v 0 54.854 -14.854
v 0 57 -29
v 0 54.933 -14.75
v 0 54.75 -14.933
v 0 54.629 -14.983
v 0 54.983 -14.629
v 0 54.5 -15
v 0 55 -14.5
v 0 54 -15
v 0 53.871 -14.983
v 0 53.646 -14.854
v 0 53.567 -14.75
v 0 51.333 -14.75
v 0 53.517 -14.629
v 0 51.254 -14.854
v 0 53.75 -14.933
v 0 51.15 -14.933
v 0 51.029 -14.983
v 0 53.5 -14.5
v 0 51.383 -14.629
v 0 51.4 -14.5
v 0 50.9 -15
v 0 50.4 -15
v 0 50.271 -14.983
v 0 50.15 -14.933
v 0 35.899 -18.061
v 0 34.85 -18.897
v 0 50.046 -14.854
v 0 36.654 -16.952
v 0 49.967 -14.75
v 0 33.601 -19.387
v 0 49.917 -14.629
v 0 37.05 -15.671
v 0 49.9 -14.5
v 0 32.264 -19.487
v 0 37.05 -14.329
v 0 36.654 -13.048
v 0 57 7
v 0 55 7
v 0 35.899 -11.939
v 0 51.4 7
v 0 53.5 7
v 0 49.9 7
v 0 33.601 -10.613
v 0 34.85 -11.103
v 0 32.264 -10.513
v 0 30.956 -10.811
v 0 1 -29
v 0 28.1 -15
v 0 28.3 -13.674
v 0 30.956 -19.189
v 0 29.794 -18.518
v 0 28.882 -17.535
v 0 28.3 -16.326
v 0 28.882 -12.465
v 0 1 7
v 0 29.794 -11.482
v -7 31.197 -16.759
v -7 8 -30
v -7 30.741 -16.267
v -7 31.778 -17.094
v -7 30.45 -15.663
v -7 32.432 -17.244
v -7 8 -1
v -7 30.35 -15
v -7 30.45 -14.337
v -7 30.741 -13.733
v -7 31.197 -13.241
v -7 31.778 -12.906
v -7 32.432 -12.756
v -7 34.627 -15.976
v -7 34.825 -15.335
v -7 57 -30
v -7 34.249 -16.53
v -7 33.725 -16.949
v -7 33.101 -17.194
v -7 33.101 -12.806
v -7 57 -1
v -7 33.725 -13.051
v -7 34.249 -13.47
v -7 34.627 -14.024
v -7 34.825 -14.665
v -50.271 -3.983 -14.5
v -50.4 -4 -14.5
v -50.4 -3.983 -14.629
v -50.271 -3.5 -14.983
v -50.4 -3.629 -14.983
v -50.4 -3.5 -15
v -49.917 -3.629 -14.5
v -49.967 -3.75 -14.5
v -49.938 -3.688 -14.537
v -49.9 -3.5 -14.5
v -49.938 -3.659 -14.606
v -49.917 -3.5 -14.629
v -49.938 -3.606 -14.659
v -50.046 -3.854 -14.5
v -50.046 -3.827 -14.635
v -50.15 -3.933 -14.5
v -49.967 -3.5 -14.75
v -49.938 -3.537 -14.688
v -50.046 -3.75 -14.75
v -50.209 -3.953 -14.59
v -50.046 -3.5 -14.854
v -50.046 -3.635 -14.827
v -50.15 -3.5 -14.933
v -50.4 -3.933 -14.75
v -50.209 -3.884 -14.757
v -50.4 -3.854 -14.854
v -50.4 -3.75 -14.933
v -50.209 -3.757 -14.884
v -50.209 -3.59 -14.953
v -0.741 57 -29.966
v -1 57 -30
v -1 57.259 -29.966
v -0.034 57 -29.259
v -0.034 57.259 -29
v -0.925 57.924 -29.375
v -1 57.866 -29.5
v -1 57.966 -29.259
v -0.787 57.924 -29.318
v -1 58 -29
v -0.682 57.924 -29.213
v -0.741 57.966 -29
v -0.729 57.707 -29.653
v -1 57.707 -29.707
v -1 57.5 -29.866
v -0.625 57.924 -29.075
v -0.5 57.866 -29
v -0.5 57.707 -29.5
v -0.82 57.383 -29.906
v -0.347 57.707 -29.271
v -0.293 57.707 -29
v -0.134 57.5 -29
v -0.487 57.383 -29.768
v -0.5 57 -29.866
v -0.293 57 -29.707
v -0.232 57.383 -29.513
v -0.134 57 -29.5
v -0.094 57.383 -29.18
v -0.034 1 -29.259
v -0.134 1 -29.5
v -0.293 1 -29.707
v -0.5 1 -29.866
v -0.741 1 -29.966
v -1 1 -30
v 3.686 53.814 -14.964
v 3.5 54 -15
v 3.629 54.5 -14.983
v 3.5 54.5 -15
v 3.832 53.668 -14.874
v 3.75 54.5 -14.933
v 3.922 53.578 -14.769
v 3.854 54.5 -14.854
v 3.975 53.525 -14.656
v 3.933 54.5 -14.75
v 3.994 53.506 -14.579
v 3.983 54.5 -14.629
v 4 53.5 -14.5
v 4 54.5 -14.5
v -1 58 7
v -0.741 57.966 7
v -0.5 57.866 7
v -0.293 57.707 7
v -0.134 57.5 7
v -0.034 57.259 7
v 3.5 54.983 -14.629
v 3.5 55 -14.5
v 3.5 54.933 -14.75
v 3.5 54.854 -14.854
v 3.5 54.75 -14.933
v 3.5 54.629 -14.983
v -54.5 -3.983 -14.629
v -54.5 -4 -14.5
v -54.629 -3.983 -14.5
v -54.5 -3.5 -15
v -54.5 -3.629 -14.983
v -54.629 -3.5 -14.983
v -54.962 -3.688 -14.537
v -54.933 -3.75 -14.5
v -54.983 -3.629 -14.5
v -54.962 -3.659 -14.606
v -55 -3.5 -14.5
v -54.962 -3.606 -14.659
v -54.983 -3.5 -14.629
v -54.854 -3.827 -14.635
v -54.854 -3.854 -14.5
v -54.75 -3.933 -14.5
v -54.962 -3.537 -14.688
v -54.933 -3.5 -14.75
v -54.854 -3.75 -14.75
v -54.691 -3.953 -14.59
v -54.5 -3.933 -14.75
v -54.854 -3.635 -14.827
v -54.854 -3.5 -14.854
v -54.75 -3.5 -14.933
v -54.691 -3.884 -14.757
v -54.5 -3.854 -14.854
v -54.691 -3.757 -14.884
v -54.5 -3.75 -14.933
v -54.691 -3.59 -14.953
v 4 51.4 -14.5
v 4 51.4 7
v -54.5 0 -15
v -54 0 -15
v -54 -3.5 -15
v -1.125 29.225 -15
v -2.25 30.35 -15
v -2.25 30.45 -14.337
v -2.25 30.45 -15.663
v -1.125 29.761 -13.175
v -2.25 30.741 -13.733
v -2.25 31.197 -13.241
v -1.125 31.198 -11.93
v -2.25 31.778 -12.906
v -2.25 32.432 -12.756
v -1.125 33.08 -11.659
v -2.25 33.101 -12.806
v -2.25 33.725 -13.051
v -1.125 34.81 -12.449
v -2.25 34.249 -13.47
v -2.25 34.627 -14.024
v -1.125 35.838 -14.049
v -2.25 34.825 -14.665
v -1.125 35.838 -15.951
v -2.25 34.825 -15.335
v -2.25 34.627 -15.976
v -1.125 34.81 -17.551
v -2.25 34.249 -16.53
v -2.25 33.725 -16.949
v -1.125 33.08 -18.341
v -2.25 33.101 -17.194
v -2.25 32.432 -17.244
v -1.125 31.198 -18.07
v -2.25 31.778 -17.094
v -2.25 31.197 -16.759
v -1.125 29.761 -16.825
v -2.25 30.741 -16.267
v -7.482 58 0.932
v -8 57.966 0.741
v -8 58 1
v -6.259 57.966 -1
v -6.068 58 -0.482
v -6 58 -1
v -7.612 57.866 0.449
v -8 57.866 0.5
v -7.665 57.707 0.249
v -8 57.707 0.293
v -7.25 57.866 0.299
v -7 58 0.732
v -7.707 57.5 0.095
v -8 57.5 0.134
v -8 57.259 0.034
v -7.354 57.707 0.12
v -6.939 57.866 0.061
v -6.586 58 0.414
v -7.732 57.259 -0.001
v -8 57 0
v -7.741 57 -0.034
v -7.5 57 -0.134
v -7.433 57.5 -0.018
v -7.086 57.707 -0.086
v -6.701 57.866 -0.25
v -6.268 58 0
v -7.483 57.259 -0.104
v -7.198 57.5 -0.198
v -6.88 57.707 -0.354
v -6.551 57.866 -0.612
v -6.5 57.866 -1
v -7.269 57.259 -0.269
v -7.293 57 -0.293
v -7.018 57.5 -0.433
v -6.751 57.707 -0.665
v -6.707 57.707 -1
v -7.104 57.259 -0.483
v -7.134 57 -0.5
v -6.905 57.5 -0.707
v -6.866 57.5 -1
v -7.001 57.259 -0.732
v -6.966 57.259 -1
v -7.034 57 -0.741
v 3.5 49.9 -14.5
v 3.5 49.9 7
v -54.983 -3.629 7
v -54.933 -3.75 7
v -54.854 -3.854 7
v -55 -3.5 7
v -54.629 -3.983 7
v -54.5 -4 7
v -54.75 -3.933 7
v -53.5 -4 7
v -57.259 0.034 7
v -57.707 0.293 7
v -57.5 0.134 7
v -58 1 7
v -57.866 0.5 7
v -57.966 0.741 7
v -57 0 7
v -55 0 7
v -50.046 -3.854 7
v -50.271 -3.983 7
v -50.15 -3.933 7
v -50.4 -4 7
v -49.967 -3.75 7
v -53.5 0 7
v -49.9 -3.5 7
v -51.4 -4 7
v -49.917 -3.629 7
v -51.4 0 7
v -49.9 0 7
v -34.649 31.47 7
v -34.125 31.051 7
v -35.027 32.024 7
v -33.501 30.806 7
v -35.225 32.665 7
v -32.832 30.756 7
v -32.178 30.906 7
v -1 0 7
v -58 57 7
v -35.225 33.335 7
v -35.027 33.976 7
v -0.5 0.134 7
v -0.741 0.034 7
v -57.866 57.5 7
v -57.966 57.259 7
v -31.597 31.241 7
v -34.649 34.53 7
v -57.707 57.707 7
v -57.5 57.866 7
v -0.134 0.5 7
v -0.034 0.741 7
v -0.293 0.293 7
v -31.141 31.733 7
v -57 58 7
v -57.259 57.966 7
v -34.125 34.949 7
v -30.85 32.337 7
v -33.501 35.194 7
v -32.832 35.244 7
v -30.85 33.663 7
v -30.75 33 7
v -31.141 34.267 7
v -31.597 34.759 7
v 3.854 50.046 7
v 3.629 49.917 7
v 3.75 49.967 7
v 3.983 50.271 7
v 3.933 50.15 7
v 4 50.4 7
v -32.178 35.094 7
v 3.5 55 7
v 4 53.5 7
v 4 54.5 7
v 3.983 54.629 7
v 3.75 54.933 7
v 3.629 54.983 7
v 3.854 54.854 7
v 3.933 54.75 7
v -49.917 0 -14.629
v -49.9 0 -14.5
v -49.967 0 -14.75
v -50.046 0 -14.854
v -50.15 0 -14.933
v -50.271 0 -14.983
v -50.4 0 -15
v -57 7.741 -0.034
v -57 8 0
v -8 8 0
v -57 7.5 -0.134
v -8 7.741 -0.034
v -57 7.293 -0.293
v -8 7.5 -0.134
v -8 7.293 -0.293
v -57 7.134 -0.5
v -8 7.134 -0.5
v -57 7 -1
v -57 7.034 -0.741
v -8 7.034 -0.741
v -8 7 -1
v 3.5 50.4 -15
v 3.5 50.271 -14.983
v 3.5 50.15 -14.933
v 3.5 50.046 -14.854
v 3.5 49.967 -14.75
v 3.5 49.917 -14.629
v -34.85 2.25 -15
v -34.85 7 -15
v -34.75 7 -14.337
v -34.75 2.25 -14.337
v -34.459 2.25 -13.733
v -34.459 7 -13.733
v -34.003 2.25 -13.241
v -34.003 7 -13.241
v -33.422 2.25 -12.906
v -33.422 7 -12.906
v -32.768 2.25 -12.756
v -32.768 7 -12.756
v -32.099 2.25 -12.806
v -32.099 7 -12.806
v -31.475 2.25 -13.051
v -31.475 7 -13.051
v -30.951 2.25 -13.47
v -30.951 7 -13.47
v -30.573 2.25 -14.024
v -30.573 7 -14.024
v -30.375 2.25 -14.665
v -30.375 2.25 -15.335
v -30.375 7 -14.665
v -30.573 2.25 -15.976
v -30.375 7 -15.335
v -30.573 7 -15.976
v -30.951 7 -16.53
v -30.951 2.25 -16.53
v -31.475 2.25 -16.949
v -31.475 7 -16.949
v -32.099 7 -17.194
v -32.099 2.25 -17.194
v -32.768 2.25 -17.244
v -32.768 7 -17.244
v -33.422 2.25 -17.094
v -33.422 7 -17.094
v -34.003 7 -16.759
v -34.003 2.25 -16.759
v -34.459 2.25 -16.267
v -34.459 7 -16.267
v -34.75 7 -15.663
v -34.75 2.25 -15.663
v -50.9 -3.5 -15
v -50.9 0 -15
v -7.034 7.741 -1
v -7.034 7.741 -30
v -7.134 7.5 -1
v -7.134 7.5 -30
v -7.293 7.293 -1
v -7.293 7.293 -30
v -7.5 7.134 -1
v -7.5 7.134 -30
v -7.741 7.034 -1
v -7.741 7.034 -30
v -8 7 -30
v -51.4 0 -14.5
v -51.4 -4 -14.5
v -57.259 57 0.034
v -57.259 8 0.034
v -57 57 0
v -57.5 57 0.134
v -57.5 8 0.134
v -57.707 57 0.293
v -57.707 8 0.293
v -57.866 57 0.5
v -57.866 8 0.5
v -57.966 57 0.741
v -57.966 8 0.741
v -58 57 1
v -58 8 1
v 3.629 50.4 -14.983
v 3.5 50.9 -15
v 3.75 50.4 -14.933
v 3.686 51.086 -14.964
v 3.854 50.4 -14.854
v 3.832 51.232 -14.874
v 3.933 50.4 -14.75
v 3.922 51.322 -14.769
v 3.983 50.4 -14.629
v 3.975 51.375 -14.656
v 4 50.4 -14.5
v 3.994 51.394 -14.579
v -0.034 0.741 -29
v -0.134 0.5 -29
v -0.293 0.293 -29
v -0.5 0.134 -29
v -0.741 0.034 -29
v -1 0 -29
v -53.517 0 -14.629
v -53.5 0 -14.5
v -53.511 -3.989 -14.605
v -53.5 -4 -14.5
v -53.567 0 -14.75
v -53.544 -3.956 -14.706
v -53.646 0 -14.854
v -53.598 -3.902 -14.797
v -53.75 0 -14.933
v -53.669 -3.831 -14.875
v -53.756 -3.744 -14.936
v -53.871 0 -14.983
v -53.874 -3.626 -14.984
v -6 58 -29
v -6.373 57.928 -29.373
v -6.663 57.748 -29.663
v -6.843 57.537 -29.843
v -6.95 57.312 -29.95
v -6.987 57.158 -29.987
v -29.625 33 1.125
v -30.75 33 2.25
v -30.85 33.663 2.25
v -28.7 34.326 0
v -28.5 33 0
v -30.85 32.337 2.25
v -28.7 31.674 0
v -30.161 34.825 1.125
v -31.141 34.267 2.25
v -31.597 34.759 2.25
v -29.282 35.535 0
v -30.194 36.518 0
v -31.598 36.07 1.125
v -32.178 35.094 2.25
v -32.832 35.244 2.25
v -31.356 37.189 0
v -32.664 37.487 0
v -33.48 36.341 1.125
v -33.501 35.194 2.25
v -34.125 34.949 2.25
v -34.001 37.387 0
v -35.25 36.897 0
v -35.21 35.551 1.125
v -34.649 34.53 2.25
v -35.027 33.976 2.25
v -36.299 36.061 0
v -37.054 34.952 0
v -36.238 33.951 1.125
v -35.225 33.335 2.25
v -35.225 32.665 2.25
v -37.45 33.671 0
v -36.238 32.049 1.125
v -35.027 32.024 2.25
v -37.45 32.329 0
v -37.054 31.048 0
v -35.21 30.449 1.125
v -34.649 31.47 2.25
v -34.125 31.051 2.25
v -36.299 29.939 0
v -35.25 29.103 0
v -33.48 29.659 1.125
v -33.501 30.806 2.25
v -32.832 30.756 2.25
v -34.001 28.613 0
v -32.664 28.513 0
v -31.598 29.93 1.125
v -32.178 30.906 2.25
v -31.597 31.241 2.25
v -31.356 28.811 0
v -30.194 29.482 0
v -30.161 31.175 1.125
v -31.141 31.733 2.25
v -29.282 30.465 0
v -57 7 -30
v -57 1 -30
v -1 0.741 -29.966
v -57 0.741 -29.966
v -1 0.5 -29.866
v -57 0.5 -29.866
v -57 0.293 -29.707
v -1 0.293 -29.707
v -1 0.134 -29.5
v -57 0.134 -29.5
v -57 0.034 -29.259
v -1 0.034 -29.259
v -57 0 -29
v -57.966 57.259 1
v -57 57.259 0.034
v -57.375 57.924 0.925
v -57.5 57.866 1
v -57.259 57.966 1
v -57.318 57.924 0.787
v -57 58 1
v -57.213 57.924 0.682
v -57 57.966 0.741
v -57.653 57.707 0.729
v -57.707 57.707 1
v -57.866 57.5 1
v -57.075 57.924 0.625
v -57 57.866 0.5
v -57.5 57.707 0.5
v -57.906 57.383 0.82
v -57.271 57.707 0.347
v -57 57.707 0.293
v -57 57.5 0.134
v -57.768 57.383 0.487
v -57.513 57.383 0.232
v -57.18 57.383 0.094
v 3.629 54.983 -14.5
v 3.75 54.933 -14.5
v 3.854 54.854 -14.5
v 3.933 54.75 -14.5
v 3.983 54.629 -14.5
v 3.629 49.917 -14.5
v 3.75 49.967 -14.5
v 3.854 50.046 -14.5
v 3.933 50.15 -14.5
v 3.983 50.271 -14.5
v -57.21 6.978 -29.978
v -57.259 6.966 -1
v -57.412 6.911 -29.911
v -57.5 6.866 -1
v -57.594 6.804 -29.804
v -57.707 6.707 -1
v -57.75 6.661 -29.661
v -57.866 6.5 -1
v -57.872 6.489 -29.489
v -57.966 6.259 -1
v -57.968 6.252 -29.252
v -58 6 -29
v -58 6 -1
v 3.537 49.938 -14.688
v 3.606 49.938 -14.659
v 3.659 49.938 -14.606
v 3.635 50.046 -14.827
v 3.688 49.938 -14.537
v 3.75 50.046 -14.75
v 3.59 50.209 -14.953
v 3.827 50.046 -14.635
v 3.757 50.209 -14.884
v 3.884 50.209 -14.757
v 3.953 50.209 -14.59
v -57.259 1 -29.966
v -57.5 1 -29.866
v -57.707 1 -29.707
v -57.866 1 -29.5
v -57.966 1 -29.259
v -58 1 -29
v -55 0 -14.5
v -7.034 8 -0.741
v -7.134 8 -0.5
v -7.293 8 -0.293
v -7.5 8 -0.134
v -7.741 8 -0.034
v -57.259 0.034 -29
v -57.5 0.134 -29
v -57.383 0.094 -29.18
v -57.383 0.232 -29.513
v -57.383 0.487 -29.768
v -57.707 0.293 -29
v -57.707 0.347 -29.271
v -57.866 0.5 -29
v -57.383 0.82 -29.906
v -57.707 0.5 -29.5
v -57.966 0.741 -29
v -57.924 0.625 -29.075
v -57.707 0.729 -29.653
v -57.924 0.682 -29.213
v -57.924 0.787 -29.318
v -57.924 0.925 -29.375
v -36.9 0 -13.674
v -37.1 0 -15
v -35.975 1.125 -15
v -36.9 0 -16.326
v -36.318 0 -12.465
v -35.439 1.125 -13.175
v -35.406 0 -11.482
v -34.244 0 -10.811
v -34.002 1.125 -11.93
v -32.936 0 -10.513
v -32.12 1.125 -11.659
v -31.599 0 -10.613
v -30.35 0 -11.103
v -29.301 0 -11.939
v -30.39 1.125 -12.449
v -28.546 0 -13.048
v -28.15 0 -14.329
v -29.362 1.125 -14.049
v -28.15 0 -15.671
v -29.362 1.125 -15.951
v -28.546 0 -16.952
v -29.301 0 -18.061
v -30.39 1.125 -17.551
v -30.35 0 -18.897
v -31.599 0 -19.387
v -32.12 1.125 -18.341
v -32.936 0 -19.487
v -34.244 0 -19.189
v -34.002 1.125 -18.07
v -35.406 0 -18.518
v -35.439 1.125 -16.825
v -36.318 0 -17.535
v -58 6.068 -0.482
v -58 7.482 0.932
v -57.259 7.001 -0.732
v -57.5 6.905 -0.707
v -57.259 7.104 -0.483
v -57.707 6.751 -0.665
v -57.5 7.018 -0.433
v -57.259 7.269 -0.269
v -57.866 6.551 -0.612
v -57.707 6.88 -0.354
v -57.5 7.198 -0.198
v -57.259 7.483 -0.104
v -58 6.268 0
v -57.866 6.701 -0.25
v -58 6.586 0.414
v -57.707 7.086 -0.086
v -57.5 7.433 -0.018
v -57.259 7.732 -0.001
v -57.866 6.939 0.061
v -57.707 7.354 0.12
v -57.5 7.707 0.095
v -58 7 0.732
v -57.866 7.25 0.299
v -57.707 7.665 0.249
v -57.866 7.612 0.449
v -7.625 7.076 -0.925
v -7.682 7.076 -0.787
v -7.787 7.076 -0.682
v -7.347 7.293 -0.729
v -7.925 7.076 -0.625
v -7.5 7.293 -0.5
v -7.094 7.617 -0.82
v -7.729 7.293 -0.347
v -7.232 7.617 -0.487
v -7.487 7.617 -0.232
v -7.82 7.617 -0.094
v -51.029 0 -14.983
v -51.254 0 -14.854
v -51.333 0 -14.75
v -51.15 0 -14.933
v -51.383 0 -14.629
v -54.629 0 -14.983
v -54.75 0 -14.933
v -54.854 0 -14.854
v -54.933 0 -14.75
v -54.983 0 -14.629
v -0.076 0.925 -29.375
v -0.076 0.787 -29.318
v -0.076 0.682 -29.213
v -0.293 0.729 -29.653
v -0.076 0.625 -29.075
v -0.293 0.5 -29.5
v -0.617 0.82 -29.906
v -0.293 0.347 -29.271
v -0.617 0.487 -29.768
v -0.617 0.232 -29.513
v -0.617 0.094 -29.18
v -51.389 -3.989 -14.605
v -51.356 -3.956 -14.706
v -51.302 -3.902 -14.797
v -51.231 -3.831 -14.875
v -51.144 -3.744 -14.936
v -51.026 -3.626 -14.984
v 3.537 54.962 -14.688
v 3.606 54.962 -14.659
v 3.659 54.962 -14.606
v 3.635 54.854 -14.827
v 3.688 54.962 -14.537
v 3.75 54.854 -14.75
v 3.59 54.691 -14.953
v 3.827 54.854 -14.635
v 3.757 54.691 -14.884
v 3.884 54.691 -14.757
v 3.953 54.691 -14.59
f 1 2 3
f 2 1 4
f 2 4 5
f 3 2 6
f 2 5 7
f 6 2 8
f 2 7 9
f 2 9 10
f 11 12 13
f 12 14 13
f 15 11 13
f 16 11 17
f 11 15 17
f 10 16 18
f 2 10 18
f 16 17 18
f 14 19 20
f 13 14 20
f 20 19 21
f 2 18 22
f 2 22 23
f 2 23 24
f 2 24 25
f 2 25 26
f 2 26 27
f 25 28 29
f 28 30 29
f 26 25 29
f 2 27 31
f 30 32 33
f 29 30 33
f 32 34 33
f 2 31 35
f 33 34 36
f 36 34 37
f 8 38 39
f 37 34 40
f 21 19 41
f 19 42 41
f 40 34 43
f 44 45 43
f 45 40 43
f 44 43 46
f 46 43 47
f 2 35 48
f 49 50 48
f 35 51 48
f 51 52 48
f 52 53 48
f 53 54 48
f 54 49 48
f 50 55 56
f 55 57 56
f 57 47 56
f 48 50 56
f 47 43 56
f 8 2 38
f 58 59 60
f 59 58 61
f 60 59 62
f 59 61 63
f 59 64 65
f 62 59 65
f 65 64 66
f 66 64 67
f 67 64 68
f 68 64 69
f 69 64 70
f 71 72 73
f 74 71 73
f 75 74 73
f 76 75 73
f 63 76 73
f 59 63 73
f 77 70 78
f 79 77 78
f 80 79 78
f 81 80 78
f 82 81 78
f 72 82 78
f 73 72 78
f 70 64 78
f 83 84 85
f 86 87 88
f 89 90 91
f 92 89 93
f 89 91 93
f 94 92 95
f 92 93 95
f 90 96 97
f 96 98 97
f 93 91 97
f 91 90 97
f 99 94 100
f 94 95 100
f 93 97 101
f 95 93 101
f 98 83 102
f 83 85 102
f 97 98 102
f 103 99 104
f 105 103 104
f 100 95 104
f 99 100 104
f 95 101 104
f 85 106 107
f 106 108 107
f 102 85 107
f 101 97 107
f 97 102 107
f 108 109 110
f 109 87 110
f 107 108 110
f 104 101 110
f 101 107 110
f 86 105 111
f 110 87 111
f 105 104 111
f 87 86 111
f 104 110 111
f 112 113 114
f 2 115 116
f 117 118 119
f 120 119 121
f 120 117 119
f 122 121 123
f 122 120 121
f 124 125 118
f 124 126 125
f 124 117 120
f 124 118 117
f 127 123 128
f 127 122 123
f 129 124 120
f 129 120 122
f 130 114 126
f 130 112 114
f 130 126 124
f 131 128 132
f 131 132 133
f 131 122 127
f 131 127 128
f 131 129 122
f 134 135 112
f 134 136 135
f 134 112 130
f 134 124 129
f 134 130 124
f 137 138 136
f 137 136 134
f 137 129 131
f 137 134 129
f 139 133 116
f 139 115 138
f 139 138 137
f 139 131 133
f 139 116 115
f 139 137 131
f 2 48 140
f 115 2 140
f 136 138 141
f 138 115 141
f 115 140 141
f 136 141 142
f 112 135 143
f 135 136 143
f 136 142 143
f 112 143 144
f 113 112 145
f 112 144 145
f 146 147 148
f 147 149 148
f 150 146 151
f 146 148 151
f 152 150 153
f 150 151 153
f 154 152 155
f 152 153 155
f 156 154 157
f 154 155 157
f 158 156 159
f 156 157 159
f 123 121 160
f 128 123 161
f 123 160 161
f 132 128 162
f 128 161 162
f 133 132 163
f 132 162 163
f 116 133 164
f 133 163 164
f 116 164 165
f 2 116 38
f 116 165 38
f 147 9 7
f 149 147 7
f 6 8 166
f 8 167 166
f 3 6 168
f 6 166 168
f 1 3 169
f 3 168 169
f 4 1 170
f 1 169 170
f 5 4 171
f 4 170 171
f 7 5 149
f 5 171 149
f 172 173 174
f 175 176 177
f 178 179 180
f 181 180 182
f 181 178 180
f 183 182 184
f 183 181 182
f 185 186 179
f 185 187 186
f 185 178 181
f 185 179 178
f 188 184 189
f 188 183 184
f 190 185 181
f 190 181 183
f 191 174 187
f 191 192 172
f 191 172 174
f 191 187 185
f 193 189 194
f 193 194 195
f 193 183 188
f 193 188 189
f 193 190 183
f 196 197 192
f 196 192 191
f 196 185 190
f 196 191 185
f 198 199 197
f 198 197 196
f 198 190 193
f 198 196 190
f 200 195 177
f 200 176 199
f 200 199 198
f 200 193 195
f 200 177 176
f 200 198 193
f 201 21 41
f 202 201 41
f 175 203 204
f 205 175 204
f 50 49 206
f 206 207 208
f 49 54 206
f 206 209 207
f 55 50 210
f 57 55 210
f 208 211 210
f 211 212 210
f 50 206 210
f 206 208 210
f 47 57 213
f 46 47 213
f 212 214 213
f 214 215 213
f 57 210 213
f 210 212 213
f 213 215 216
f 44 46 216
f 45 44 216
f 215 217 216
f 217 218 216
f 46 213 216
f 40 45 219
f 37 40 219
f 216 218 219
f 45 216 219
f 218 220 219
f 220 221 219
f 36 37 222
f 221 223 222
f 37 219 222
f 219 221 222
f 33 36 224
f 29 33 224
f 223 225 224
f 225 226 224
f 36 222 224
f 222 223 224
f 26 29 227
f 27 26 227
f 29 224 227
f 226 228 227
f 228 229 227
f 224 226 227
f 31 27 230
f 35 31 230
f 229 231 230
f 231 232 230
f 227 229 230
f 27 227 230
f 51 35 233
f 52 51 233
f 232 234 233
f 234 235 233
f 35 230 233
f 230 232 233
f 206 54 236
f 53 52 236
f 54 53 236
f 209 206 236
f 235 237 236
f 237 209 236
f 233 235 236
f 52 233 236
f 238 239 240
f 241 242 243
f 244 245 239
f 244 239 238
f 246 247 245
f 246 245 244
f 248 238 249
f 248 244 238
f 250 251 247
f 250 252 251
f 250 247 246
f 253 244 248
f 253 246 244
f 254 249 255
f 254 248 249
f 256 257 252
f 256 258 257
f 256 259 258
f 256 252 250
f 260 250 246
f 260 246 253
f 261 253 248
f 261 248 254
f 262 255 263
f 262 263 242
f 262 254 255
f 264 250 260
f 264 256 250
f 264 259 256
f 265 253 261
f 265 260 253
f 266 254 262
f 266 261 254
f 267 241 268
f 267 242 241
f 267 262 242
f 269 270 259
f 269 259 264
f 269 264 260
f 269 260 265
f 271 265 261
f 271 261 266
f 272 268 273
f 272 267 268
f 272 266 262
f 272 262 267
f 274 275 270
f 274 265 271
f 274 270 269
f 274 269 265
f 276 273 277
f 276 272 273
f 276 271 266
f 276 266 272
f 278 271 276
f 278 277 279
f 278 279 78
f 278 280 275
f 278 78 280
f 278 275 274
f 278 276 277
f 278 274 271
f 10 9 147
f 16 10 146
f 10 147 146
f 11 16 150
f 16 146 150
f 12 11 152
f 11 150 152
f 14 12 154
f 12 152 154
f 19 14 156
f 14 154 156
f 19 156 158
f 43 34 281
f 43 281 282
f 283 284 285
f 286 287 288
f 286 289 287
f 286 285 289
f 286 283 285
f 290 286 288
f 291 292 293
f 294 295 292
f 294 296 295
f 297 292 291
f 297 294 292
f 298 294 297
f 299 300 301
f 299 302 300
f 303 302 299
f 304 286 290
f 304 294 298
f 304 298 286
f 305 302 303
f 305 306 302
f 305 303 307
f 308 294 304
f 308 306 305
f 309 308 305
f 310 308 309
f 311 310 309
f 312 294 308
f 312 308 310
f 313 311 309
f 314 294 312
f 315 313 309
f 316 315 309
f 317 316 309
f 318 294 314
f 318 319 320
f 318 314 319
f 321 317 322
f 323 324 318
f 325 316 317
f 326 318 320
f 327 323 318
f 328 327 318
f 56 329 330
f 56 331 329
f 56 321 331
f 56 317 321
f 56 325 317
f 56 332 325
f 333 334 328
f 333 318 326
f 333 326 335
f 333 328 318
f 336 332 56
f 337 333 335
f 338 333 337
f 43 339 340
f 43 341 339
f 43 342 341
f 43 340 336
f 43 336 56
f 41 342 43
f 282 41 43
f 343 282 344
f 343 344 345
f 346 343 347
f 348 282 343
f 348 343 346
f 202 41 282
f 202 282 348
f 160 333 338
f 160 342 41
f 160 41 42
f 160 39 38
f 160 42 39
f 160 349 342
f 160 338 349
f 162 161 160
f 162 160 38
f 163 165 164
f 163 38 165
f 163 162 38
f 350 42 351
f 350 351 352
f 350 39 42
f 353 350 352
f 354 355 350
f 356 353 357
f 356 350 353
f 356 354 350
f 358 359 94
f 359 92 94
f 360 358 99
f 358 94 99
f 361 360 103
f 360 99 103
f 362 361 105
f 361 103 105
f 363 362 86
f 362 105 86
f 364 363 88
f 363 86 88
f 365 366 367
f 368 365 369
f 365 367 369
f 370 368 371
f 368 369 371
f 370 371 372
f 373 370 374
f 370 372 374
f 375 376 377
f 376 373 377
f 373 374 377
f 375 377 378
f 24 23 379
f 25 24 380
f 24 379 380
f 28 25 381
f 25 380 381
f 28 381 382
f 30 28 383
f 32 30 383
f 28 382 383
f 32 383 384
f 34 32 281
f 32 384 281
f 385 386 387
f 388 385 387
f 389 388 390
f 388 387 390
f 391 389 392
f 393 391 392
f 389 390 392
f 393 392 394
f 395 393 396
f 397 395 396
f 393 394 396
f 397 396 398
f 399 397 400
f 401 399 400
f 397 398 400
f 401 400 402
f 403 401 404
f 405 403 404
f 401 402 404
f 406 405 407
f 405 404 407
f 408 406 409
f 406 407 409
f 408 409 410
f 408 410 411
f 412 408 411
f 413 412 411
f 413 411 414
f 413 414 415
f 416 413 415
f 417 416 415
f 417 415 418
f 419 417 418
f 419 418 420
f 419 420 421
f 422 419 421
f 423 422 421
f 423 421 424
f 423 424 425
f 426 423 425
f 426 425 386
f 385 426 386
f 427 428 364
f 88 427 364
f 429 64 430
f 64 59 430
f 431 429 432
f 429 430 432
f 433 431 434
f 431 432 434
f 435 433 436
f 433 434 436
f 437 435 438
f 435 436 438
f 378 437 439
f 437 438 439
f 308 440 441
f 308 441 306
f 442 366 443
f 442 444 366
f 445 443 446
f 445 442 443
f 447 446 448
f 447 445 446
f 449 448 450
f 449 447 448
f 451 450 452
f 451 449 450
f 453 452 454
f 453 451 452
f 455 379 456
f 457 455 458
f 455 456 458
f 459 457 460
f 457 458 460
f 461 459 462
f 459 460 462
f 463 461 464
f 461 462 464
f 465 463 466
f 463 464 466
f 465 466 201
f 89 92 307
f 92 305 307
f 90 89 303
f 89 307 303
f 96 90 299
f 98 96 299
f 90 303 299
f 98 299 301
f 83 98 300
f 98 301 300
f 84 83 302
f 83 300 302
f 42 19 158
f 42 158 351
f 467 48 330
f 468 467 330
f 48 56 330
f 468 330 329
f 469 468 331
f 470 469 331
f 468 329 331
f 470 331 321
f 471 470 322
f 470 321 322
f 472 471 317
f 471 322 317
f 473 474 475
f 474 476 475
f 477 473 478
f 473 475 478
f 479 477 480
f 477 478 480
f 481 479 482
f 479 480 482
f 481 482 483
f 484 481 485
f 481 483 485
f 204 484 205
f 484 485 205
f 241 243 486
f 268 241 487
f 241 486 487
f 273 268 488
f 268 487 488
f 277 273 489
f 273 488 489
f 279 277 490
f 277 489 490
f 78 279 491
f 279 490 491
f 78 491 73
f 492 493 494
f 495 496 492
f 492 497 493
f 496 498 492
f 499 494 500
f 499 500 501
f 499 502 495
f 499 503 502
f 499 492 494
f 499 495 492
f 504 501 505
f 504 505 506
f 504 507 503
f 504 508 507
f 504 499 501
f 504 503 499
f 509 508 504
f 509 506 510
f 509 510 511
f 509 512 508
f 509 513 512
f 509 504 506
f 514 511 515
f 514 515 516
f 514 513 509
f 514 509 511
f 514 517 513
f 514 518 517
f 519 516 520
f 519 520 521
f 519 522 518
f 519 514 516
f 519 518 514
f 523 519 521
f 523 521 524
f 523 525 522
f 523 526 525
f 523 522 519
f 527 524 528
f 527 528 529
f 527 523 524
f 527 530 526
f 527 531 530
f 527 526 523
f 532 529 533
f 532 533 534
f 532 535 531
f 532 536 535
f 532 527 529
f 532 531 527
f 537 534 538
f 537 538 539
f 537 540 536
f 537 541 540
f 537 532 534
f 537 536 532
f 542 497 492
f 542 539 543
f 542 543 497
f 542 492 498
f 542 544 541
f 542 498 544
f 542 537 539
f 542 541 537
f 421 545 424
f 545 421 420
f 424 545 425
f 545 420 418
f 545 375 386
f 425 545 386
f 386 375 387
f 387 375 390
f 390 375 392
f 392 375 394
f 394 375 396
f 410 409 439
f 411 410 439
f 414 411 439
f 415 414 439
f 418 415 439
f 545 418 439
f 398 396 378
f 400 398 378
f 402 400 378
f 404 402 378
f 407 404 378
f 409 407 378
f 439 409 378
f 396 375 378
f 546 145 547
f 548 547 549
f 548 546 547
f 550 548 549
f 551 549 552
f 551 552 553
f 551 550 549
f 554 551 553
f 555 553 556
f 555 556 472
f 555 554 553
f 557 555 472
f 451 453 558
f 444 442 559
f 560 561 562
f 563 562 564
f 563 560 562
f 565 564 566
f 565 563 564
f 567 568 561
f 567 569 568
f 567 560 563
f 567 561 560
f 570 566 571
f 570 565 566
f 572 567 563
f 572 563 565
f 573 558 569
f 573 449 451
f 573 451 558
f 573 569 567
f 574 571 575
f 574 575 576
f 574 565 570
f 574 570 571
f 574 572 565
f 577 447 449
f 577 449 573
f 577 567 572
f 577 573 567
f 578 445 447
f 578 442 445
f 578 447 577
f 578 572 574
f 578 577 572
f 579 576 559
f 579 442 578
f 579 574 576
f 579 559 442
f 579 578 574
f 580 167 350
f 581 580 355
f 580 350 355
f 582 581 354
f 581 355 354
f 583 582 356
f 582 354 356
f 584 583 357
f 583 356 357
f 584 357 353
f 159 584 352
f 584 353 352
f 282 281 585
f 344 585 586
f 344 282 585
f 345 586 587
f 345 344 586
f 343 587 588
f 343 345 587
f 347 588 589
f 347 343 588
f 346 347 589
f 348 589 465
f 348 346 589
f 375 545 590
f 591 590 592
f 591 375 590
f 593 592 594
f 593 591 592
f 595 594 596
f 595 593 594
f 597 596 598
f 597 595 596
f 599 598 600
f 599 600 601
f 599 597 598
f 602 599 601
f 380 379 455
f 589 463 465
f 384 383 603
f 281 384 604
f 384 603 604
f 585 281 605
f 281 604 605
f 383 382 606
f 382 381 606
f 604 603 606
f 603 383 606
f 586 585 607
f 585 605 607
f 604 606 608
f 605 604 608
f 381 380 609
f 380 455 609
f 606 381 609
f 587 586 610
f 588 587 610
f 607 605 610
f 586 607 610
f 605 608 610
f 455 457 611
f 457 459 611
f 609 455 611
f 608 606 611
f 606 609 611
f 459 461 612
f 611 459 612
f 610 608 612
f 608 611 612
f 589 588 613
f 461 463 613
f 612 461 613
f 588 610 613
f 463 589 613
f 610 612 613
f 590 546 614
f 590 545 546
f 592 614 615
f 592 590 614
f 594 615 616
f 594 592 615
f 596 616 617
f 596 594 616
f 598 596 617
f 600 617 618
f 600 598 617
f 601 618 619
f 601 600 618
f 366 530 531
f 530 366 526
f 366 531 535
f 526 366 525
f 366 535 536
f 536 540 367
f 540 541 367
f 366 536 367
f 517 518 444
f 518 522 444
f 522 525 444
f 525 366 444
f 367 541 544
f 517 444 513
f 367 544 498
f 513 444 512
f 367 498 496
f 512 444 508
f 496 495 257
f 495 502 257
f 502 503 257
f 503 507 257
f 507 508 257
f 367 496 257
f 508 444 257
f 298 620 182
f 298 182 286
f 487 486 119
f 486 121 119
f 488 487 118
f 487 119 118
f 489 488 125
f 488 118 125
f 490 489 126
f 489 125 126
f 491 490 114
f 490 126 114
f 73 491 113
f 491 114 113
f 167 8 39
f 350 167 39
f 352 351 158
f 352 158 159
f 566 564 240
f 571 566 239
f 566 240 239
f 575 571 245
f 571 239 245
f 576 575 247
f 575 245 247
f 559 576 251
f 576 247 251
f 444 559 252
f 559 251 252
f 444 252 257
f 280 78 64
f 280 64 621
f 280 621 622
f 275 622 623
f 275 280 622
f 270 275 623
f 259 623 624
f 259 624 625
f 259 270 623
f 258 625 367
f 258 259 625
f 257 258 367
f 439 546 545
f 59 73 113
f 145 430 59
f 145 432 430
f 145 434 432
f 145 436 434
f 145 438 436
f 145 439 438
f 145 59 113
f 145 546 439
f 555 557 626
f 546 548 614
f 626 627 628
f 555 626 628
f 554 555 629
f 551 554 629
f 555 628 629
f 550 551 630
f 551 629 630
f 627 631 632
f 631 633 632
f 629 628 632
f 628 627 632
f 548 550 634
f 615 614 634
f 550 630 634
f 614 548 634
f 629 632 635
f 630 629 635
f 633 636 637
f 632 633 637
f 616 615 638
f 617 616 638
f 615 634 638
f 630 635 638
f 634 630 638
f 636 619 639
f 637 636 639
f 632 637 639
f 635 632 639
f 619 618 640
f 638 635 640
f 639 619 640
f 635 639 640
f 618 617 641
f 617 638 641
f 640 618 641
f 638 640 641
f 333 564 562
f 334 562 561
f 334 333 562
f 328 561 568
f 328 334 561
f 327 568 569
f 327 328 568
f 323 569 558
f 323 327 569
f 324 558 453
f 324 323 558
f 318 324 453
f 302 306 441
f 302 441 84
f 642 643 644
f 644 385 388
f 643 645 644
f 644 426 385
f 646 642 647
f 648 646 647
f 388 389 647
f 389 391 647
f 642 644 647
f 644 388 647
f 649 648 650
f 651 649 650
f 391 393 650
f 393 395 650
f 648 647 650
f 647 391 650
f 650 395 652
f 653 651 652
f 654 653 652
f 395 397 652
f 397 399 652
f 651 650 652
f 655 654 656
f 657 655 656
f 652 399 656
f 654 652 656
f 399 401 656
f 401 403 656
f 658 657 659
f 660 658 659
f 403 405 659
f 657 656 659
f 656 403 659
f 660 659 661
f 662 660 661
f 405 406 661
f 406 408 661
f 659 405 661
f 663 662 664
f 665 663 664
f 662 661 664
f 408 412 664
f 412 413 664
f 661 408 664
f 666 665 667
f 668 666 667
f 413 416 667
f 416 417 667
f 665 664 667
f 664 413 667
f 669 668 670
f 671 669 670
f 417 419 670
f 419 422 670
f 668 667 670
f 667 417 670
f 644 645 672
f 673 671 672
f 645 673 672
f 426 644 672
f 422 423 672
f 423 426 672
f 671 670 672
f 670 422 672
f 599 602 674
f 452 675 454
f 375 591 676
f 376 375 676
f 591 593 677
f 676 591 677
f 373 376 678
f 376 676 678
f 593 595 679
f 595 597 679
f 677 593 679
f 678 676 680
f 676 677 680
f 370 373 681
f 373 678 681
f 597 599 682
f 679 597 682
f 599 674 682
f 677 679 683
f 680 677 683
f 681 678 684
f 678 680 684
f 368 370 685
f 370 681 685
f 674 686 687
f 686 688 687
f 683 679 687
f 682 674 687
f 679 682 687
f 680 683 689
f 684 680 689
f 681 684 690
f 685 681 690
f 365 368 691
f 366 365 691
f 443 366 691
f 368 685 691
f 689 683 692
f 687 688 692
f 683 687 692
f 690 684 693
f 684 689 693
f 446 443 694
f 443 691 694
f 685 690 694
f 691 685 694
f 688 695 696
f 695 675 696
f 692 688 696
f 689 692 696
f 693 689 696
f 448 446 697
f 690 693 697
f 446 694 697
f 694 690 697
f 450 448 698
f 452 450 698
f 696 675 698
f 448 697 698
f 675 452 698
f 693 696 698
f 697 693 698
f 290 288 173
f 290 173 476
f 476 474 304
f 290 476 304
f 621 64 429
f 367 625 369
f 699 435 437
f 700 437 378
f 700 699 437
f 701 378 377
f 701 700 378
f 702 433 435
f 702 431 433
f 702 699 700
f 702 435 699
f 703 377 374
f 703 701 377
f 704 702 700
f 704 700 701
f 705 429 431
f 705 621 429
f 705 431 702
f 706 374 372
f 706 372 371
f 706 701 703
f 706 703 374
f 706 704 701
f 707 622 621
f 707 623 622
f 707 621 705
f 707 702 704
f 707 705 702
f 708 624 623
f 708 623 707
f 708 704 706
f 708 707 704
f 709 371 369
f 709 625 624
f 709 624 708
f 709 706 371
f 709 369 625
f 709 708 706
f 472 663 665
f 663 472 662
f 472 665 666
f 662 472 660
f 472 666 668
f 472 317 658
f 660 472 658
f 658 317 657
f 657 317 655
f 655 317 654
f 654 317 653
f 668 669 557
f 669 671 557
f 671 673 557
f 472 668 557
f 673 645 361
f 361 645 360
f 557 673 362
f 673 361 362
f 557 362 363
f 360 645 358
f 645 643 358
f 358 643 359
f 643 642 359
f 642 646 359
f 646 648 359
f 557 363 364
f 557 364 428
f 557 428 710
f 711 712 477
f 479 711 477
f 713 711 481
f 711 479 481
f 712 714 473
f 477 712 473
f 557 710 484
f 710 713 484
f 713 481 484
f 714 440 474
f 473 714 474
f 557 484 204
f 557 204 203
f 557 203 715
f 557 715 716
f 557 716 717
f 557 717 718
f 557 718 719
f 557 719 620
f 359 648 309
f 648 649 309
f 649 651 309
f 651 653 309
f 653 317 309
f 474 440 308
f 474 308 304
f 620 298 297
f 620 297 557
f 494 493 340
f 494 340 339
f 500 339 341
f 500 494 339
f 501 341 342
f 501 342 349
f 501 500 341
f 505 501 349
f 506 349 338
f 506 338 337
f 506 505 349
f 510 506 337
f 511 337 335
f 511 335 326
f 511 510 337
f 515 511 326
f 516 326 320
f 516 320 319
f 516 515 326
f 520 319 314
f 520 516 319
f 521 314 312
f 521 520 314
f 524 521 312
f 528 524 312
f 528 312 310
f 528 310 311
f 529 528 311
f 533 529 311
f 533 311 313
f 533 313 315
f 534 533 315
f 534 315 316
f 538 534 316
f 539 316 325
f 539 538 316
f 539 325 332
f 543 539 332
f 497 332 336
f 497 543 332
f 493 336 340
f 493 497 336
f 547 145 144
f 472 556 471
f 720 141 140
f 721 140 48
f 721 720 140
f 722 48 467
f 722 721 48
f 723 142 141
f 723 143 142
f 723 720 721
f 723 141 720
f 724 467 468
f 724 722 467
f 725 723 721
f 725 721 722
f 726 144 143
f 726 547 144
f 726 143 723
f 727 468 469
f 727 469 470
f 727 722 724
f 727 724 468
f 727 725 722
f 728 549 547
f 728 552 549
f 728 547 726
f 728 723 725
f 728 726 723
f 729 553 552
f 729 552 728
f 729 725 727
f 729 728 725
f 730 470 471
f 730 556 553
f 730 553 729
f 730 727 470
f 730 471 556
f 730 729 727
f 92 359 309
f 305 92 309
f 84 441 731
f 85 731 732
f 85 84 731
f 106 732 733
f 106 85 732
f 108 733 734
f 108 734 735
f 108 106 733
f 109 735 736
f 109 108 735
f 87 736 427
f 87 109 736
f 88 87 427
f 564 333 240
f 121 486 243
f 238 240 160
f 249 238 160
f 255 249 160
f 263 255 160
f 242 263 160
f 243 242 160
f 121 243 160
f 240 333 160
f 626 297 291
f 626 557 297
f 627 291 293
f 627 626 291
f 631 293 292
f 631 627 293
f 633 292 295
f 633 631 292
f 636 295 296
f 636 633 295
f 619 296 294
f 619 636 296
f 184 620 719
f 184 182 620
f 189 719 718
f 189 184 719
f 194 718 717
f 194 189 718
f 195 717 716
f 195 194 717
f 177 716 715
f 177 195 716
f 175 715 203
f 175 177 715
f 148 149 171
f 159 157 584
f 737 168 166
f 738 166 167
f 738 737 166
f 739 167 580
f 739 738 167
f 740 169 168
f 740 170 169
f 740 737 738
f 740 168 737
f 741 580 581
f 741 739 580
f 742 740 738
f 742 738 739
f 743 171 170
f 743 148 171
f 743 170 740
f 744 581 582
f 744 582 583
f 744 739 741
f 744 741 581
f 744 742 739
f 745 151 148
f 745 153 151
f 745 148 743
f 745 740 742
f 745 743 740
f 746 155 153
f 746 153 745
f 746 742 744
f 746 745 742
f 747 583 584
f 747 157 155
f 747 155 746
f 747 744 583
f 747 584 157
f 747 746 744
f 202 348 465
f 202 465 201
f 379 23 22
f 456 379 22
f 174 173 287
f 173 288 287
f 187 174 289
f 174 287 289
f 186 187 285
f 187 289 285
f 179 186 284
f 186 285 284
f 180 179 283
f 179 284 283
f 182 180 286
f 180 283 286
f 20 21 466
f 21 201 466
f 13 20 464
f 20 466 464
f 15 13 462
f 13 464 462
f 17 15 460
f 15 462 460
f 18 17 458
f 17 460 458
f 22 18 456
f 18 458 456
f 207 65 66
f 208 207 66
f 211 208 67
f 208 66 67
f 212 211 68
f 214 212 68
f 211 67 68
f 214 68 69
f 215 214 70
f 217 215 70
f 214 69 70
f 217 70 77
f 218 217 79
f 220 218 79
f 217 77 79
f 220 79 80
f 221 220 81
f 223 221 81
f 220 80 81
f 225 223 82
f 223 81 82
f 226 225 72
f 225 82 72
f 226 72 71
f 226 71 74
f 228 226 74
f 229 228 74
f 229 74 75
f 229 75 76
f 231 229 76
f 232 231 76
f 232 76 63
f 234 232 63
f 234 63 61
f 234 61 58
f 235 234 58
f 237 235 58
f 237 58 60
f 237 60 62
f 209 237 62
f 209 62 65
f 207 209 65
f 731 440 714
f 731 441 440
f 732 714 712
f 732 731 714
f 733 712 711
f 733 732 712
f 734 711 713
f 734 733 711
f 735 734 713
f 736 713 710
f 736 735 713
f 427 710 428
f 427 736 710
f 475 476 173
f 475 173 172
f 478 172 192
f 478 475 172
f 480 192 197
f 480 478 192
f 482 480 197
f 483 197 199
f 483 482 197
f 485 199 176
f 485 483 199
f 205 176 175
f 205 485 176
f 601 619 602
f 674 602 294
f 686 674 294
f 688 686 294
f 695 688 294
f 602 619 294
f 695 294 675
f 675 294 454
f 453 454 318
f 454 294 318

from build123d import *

# Parameters (mm, degrees)
F0_W      = 58
F0_H      = 58
F0_R      = 2.25
F1_DEPTH  = 7
F3_DEPTH  = 30
F4_R      = 2.25
F5_DEPTH  = 25
F6_R      = 2.25
F7_DEPTH  = 25
F8_R      = 1
F9_R      = 1
F10_R     = 1
F11_R     = 1
F12_SIZE2 = 2.25
F12_SIZE  = 2.25
F13_W     = 1.5
F13_H     = 22
F14_DEPTH = 4
F15_W     = 1.5
F15_H     = 22
F16_DEPTH = 4
F17_R     = 0.5
F18_R     = 0.5


with BuildPart() as f1:
    # F0 (on Top) → F1 (new body)
    with BuildSketch(Plane.XY):
        with Locations((-29, 29)):
            Rectangle(F0_W, F0_H)
        with Locations((-33, 33)):
            Circle(F0_R, mode=Mode.SUBTRACT)
    extrude(amount=F1_DEPTH)

    # F2 (on face) → F3 (join)
    with BuildSketch(Plane(origin=(0, 0, 0), x_dir=(1, 0, 0), z_dir=(0, 0, -1))):
        Polygon((0, -58), (0, 0), (-58, 0), (-58, -7), (-7, -7), (-7, -58), align=None)
    extrude(amount=F3_DEPTH)

    # F4 (on face) → F5 (cut)
    with BuildSketch(Plane(origin=(-7, 0, 0), x_dir=(0, -1, 0), z_dir=(-1, 0, 0))):
        with Locations((-32.6, -15)):
            Circle(F4_R)
    extrude(amount=-F5_DEPTH, mode=Mode.SUBTRACT)

    # F6 (on face) → F7 (cut)
    with BuildSketch(Plane(origin=(0, 7, 0), x_dir=(-1, 0, 0), z_dir=(0, 1, 0))):
        with Locations((32.6, -15)):
            Circle(F6_R)
    extrude(amount=-F7_DEPTH, mode=Mode.SUBTRACT)

    # F8
    f8_edges = [f1.edges().sort_by_distance(p)[0] for p in [
        (-29, 0, -30),
    ]]
    fillet(f8_edges, radius=F8_R)

    # F9
    f9_edges = [f1.edges().sort_by_distance(p)[0] for p in [
        (0, 29.5, -30),
    ]]
    fillet(f9_edges, radius=F9_R)

    # F10
    f10_edges = [f1.edges().sort_by_distance(p)[0] for p in [
        (-7, 32.5, 0),
        (-7, 7, -15),
        (-32.5, 7, 0),
    ]]
    fillet(f10_edges, radius=F10_R)

    # F11
    f11_edges = [f1.edges().sort_by_distance(p)[0] for p in [
        (-58, 4, -30),
        (-58, 0, -11),
        (-58, 33, 0),
        (-58, 7, -15.5),
        (-58, 7.292893, -0.292893),
        (-58, 0.292893, -29.707107),
        (-58, 58, 3.5),
        (-33, 58, 0),
        (-7.292893, 58, -0.292893),
        (-4, 58, -30),
        (-7, 58, -15.5),
        (0, 58, -11),
    ]]
    fillet(f11_edges, radius=F11_R)

    # F12
    f12_edges = [f1.edges().sort_by_distance(p)[0] for p in [
        (-35.25, 33, 0),
        (-30.35, 0, -15),
        (0, 34.85, -15),
    ]]
    chamfer(f12_edges, length=F12_SIZE, length2=F12_SIZE2)

    # F13 (on face) → F14 (join)
    with BuildSketch(Plane.XZ):
        with Locations((-50.65, -4)):
            Rectangle(F13_W, F13_H)
        with Locations((-54.25, -4)):
            Rectangle(F13_W, F13_H)
    extrude(amount=F14_DEPTH)

    # F15 (on face) → F16 (join)
    with BuildSketch(Plane.YZ):
        with Locations((54.25, -4)):
            Rectangle(F15_W, F15_H)
        with Locations((50.65, -4)):
            Rectangle(F15_W, F15_H)
    extrude(amount=F16_DEPTH)

    # F17
    f17_edges = [f1.edges().sort_by_distance(p)[0] for p in [
        (4, 54.25, -15),
        (4, 50.65, -15),
        (2, 51.4, -15),
        (2, 49.9, -15),
        (4, 49.9, -4),
        (2, 53.5, -15),
        (2, 55, -15),
        (4, 55, -4),
    ]]
    fillet(f17_edges, radius=F17_R)

    # F18
    f18_edges = [f1.edges().sort_by_distance(p)[0] for p in [
        (-50.65, -4, -15),
        (-54.25, -4, -15),
        (-49.9, -4, -4),
        (-49.9, -2, -15),
        (-55, -4, -4),
        (-55, -2, -15),
        (-53.5, -2, -15),
        (-51.4, -2, -15),
    ]]
    fillet(f18_edges, radius=F18_R)


solid = f1.part
